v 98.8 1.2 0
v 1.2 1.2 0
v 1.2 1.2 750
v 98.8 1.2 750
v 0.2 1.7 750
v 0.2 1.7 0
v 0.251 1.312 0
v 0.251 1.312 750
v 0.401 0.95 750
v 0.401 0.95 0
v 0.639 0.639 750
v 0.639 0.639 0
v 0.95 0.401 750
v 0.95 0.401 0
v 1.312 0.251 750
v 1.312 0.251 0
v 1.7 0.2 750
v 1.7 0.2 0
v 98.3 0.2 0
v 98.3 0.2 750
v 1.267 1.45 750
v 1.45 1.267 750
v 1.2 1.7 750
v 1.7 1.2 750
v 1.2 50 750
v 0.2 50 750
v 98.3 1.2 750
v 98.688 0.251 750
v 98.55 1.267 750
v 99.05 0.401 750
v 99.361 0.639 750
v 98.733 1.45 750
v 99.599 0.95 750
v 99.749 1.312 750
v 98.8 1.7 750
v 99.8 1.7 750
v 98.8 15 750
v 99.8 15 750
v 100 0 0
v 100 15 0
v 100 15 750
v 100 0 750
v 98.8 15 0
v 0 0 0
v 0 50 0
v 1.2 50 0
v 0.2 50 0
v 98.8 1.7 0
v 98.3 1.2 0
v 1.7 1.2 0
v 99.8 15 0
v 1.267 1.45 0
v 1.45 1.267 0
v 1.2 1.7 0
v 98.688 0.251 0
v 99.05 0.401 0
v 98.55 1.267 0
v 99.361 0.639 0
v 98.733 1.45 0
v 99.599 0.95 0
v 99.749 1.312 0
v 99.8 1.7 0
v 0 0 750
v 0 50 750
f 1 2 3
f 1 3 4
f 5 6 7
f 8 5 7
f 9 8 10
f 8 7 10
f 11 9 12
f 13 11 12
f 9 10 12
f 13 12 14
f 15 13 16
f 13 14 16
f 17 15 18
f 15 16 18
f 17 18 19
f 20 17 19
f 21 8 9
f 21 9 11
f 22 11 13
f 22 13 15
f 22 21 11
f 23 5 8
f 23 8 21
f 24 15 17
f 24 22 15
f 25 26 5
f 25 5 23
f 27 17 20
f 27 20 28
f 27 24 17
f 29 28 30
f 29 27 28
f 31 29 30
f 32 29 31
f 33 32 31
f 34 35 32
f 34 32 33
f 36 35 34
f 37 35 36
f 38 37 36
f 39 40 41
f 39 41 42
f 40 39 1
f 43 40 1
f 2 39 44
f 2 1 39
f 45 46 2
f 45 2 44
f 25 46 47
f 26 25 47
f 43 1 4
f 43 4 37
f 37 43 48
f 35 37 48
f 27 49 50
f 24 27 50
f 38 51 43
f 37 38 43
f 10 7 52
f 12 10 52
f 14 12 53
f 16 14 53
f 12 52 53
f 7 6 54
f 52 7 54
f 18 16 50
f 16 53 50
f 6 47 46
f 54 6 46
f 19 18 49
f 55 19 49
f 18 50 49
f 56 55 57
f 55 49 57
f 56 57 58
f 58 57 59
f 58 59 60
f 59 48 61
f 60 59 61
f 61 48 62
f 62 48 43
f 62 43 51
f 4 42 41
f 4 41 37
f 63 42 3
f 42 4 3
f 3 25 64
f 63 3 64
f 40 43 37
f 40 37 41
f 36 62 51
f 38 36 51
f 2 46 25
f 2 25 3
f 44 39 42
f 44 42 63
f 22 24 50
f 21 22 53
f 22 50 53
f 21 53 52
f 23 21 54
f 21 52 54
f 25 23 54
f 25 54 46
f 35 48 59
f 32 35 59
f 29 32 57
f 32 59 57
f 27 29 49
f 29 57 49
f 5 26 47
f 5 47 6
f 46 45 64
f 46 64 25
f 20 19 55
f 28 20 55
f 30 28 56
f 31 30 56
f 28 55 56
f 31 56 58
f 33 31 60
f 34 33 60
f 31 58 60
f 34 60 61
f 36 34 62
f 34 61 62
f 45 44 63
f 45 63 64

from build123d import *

# Parameters (mm, degrees)
EXTRUDE_2_DEPTH     = 750
SHEET_METAL_3_DEPTH = 750


# Read off the part's stored shape, not the designer's step: Преобразовать-Твердое тело3
with BuildPart() as part:
    # Эскиз3 → Бобышка-Вытянуть2 (new body)
    with BuildSketch(Plane.XY):
        Polygon((0, 0), (0, 50), (1.2, 50), (1.2, 1.2), (98.8, 1.2), (98.8, 15), (100, 15), (100, 0), align=None)
    extrude(amount=EXTRUDE_2_DEPTH)


with BuildPart() as body_2:
    # Sheet Metal 3 outline → Sheet Metal 3 (new body)
    with BuildSketch(Plane.XY):
        with BuildLine():
            Line((1.2, 1.7), (1.2, 50))
            Line((1.2, 50), (0.2, 50))
            Line((0.2, 50), (0.2, 1.7))
            ThreePointArc((0.2, 1.7), (0.639339828, 0.639339828), (1.7, 0.2))
            Line((1.7, 0.2), (98.3, 0.2))
            ThreePointArc((98.3, 0.2), (99.360660172, 0.639339828), (99.8, 1.7))
            Line((99.8, 1.7), (99.8, 15))
            Line((99.8, 15), (98.8, 15))
            Line((98.8, 15), (98.8, 1.7))
            ThreePointArc((98.8, 1.7), (98.653553391, 1.346446609), (98.3, 1.2))
            Line((98.3, 1.2), (1.7, 1.2))
            ThreePointArc((1.7, 1.2), (1.346446609, 1.346446609), (1.2, 1.7))
        make_face()
    extrude(amount=SHEET_METAL_3_DEPTH)


solid = Compound([part.part, body_2.part])
